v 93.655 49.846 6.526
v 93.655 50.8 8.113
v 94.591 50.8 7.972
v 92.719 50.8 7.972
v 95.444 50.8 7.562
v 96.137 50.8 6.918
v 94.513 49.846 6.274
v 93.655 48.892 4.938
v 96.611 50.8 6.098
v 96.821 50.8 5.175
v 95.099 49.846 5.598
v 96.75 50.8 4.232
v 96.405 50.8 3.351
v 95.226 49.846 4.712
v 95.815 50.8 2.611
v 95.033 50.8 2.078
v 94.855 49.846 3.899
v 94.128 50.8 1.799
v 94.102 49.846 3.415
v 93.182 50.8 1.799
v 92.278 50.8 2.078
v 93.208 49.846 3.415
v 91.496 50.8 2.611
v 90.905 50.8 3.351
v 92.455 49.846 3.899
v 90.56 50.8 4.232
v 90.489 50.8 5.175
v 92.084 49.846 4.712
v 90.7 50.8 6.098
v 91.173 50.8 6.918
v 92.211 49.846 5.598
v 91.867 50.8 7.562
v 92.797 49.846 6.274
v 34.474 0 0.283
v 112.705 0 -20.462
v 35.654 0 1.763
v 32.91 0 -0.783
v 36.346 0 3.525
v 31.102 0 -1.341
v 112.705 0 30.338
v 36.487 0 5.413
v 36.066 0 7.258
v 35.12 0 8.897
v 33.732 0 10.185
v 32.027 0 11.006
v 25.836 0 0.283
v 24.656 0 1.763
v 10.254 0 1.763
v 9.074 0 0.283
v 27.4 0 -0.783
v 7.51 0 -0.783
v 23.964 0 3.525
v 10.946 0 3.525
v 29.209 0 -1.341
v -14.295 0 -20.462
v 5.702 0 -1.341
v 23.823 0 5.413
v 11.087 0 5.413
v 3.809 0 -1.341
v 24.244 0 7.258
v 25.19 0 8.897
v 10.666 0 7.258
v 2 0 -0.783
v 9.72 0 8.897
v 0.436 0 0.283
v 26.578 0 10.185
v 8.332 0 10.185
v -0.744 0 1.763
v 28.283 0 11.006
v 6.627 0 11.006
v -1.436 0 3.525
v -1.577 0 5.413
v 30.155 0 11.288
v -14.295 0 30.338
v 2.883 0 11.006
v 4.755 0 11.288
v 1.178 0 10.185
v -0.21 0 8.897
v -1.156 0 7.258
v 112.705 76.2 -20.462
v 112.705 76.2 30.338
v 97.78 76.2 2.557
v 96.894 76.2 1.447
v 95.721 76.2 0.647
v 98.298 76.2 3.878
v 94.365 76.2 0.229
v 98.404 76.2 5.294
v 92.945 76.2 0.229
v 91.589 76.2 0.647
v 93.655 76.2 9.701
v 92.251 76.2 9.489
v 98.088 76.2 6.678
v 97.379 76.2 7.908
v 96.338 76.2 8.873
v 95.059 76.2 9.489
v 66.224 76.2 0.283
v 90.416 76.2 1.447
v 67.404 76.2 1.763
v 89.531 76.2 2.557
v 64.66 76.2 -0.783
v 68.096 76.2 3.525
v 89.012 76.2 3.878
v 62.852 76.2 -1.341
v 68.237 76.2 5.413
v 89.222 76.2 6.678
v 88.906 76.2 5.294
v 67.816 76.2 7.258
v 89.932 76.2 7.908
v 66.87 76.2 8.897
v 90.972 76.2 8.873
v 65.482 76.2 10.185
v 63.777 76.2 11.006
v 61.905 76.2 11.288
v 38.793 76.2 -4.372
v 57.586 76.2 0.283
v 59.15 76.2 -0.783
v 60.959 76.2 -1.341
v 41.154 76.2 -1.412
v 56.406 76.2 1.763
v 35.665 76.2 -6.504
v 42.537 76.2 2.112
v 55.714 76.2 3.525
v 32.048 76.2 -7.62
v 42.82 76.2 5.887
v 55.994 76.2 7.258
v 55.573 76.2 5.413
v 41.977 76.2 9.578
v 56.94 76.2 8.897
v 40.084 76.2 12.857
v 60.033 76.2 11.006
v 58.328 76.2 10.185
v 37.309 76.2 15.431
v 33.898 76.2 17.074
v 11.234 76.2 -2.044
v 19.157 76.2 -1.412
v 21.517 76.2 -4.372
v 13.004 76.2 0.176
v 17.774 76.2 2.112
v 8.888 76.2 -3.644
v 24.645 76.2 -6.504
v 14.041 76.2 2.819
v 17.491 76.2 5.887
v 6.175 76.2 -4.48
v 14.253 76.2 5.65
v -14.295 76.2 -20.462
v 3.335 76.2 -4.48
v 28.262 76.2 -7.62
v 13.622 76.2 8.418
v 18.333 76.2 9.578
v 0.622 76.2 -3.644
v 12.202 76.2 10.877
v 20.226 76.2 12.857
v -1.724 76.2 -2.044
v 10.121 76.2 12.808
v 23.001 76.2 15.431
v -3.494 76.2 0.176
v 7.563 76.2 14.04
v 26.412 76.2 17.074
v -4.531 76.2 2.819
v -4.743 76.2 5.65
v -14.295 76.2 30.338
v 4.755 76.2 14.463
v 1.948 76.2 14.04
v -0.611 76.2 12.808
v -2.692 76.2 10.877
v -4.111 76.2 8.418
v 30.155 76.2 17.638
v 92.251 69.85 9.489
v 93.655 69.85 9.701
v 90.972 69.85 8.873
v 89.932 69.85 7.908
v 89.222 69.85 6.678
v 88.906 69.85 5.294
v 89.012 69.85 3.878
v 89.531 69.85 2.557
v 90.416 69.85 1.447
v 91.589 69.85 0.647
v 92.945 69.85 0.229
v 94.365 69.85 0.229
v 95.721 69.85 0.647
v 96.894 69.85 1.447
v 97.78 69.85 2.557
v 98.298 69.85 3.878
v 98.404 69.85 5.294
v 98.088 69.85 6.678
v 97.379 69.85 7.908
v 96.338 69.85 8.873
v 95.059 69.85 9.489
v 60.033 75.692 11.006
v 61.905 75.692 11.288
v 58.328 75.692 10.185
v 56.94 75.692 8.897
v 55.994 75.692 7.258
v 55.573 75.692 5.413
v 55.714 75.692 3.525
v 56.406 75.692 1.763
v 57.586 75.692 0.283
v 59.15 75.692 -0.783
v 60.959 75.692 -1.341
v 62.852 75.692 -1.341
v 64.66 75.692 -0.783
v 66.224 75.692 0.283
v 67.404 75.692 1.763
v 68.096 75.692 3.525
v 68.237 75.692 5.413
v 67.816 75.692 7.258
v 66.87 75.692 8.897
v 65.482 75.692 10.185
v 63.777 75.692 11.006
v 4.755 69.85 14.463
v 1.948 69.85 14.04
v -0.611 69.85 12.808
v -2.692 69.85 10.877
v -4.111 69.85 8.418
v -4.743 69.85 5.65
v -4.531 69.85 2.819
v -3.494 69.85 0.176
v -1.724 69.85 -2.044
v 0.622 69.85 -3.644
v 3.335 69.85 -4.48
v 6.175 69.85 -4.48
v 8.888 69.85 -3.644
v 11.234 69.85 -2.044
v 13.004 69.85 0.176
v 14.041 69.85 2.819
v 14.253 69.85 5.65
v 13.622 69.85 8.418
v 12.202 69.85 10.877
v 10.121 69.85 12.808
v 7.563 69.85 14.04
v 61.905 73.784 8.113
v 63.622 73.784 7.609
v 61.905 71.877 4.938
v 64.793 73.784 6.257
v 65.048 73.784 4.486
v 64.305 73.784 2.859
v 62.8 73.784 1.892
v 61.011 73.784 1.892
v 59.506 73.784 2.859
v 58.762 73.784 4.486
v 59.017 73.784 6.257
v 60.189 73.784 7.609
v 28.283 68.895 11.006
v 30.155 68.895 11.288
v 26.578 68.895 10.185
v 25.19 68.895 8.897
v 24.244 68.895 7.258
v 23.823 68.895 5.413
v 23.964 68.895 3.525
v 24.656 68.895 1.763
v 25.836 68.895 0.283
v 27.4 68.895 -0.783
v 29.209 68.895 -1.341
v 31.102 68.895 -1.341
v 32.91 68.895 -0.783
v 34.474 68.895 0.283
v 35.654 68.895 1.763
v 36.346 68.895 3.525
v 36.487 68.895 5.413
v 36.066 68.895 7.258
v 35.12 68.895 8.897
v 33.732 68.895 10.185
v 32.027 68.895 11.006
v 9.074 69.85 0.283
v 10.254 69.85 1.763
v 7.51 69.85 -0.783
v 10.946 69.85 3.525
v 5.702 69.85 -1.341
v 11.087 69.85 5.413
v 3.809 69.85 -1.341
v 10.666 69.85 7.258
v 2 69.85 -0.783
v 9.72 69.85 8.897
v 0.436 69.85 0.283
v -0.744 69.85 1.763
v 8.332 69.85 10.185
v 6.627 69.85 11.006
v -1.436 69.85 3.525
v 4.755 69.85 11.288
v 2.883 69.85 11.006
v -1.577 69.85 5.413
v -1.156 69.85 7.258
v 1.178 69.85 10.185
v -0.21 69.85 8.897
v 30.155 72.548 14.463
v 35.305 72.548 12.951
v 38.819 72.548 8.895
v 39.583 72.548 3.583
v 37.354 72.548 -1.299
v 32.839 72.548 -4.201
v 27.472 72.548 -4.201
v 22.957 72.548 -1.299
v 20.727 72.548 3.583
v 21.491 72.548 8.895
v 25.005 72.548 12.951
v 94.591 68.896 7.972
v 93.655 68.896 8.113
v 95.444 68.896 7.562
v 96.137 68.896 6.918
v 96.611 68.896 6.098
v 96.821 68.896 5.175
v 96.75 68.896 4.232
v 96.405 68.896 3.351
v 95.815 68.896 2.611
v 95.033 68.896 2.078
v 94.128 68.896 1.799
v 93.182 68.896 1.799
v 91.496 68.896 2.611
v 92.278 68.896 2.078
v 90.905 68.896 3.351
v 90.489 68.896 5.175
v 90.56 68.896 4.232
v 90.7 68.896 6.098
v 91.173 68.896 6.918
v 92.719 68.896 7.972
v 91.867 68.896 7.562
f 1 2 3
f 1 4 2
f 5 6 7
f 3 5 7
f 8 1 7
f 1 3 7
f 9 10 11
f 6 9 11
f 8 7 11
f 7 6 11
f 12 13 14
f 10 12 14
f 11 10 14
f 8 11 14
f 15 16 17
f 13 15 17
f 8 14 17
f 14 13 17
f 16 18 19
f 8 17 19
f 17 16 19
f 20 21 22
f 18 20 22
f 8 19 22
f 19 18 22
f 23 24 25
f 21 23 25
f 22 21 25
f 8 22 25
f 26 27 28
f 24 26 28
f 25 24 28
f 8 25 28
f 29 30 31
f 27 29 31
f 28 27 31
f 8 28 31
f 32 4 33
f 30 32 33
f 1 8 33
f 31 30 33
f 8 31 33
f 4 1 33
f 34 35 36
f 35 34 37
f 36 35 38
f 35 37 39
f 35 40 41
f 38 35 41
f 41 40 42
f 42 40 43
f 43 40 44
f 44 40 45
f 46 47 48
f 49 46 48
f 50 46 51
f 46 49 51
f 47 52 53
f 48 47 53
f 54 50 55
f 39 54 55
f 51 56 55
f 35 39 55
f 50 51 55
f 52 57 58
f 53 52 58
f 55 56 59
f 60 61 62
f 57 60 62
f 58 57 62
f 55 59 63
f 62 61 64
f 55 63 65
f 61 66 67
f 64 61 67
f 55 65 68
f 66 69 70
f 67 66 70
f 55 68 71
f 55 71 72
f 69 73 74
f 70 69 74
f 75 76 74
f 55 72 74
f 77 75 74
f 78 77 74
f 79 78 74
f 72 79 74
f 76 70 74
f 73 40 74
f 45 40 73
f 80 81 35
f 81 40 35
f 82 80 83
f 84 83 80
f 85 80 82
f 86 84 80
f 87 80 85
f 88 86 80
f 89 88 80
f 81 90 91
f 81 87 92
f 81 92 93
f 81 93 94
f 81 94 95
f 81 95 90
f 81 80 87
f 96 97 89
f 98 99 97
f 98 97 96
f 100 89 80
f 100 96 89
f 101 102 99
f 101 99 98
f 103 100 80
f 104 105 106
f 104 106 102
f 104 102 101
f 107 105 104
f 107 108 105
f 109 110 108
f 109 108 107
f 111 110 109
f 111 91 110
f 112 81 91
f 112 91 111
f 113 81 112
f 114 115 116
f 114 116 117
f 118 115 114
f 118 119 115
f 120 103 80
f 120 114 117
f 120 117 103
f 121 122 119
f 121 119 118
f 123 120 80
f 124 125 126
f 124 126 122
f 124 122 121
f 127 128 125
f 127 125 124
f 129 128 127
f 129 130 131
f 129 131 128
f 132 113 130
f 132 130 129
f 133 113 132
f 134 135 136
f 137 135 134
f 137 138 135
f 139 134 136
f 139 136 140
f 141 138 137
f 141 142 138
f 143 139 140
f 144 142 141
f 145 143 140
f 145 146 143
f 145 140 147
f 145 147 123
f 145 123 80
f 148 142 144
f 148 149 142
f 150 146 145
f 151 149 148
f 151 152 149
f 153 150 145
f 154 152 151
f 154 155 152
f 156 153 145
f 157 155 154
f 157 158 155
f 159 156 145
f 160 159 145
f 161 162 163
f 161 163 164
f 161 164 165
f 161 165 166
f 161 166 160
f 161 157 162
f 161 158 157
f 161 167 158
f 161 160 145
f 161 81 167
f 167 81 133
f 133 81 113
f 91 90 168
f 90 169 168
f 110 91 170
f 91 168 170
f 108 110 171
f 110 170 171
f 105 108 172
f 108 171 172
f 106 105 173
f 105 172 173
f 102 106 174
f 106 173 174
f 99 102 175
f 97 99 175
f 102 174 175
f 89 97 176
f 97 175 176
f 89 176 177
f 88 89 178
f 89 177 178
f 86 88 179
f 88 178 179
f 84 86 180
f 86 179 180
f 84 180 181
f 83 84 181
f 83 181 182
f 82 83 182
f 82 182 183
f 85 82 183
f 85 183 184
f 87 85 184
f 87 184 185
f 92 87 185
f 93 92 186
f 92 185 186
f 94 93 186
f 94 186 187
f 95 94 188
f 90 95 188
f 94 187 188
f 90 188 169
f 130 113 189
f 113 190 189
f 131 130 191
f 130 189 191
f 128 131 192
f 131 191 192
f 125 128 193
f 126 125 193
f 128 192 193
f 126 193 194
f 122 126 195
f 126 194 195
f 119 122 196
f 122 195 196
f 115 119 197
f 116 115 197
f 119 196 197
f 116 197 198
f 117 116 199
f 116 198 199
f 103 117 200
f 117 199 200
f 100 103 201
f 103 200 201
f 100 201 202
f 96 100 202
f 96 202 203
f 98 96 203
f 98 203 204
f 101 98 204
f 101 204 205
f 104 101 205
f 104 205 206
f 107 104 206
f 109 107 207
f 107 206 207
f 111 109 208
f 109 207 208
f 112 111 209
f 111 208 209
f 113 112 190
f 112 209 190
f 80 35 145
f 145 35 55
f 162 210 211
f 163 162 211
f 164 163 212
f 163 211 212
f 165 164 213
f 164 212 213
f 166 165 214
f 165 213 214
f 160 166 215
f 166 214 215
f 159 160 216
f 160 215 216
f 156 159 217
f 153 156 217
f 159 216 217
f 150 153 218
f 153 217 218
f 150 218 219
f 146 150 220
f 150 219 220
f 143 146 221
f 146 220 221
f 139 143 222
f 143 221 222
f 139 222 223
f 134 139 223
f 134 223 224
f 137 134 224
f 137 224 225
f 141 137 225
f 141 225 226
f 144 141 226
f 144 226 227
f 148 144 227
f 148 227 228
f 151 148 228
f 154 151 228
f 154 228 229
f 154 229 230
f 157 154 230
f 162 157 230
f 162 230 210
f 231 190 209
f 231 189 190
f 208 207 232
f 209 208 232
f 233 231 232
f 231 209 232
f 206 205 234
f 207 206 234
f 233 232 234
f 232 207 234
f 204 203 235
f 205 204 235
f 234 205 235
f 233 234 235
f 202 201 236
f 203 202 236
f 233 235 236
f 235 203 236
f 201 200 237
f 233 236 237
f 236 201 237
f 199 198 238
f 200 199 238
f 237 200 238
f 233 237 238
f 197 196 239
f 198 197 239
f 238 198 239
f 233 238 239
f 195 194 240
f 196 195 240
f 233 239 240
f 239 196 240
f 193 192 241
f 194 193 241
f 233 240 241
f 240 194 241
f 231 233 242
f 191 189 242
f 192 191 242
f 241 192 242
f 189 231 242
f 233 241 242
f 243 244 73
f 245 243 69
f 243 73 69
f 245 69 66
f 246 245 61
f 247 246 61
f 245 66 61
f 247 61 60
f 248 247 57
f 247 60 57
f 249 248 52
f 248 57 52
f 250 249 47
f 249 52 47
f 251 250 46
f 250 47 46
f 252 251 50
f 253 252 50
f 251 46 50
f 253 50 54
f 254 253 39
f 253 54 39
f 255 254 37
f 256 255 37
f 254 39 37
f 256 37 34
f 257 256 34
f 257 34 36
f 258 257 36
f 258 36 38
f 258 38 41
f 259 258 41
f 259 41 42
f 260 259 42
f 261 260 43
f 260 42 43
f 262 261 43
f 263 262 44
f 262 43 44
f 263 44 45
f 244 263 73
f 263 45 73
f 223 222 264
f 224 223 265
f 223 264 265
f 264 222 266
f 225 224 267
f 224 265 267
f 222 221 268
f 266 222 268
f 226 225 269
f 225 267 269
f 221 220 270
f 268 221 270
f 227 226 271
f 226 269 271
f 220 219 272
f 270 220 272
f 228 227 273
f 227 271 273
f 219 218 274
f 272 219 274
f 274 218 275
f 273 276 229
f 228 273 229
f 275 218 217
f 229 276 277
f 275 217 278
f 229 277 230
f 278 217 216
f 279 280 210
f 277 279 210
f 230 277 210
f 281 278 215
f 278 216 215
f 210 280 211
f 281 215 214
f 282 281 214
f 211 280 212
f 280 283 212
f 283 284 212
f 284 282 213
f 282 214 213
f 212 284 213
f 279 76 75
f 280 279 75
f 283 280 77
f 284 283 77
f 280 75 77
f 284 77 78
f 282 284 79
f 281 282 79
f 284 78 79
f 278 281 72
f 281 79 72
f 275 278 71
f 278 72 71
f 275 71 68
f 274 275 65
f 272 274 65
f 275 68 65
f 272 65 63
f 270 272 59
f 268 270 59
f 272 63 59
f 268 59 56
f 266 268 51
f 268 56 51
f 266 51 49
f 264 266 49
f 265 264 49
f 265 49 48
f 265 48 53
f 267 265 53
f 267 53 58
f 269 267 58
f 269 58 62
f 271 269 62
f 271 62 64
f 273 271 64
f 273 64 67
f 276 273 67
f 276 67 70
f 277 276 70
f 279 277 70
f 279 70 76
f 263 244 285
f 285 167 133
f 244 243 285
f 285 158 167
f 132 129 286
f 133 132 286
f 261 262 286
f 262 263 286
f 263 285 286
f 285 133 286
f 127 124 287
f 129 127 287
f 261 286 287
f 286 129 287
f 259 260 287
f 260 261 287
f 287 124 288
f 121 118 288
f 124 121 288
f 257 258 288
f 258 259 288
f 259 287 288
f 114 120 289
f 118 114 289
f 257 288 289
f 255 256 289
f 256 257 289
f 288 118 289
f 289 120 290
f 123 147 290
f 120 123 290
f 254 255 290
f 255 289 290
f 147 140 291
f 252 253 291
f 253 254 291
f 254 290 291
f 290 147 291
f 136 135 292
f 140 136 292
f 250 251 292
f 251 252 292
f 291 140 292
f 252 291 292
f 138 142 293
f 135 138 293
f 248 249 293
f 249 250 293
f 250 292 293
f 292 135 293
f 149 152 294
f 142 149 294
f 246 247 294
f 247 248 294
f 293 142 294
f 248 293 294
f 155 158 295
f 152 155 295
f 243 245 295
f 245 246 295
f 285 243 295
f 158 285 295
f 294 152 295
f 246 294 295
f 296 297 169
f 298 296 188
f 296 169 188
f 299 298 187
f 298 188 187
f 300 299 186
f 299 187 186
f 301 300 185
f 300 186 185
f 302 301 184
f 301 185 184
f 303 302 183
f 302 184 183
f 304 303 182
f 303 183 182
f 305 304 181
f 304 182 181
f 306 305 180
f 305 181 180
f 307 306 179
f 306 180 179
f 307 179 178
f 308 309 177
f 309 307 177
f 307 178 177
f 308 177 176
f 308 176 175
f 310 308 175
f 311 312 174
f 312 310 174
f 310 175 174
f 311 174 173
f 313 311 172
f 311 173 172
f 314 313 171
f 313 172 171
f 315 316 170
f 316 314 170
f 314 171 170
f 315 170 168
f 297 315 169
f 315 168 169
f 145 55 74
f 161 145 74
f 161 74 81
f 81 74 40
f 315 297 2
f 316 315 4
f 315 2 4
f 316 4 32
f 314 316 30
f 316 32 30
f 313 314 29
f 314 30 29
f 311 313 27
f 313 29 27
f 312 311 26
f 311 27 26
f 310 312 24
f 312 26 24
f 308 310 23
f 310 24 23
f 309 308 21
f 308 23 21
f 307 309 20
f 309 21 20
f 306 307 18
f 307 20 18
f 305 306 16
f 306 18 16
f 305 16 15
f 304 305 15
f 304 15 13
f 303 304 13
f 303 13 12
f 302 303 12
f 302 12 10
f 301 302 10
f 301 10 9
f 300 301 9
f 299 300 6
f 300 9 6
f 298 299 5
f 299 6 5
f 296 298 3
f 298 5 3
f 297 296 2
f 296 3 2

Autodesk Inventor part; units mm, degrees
ref_plane "YZ Plane" through (0, 0, 0) normal (1, 0, 0) x (0, 1, 0)
ref_plane "XZ Plane" through (0, 0, 0) normal (0, 1, 0) x (-1, 0, 0)
ref_plane "XY Plane" through (0, 0, 0) normal (0, 0, 1) x (1, 0, 0)
sketch "Sketch1" plane through (0, 0, 0) normal (0, 1, 0) x (-1, 0, 0)
  line L0 (14.2949, 30.3382) -> (-112.7051, 30.3382)
  line L1 (-112.7051, 30.3382) -> (-112.7051, -20.4618)
  line L2 (-112.7051, -20.4618) -> (14.2949, -20.4618)
  line L3 (14.2949, -20.4618) -> (14.2949, 30.3382)
  point P0 (0, 0)
  dimension "d0" = 127
  dimension "d1" = 50.8
extrude "Extrusion1" add sketch "Sketch1" along normal blind 76.2
sketch "Sketch2" plane through (0, 76.2, 0) normal (0, 1, 0) x (1, 0, 0)
  line L0 (-14.2949, 20.4618) -> (-14.2949, -30.3382) projected
  line L1 (-14.2949, -4.9382) -> (4.7551, -4.9382)
  line L2 (4.7551, -4.9382) -> (30.1551, -4.9382)
  line L3 (30.1551, -4.9382) -> (61.9051, -4.9382)
  line L4 (61.9051, -4.9382) -> (93.6551, -4.9382)
  point P0 (0, 0)
  dimension "d4" = 19.05
  dimension "d5" = 25.4
  dimension "d6" = 31.75
  dimension "d7" = 31.75
hole "Hole1" at (93.6551, 76.2, 4.9382) direction (0, -1, 0) diameter 6.35 depth 25.4 tip angle 118
hole "Hole2" at (93.6551, 76.2, 4.9382) direction (0, -1, 0) diameter 9.525 depth 6.35 tip angle 118
hole "Hole3" at (61.9051, 76.2, 4.9382) direction (0, -1, 0) diameter 12.7 depth 0.508 tip angle 118
hole "Hole4" at (30.1551, 76.2, 4.9382) direction (0, -1, 0) diameter 12.7 depth 76.2 tip angle 118 countersink diameter 25.4 countersink angle 82
hole "Hole5" at (4.7551, 76.2, 4.9382) direction (0, -1, 0) diameter 12.7 depth 76.2 tip angle 118 counterbore diameter 19.05 counterbore depth 6.35
properties part number "7.2 part 4"
